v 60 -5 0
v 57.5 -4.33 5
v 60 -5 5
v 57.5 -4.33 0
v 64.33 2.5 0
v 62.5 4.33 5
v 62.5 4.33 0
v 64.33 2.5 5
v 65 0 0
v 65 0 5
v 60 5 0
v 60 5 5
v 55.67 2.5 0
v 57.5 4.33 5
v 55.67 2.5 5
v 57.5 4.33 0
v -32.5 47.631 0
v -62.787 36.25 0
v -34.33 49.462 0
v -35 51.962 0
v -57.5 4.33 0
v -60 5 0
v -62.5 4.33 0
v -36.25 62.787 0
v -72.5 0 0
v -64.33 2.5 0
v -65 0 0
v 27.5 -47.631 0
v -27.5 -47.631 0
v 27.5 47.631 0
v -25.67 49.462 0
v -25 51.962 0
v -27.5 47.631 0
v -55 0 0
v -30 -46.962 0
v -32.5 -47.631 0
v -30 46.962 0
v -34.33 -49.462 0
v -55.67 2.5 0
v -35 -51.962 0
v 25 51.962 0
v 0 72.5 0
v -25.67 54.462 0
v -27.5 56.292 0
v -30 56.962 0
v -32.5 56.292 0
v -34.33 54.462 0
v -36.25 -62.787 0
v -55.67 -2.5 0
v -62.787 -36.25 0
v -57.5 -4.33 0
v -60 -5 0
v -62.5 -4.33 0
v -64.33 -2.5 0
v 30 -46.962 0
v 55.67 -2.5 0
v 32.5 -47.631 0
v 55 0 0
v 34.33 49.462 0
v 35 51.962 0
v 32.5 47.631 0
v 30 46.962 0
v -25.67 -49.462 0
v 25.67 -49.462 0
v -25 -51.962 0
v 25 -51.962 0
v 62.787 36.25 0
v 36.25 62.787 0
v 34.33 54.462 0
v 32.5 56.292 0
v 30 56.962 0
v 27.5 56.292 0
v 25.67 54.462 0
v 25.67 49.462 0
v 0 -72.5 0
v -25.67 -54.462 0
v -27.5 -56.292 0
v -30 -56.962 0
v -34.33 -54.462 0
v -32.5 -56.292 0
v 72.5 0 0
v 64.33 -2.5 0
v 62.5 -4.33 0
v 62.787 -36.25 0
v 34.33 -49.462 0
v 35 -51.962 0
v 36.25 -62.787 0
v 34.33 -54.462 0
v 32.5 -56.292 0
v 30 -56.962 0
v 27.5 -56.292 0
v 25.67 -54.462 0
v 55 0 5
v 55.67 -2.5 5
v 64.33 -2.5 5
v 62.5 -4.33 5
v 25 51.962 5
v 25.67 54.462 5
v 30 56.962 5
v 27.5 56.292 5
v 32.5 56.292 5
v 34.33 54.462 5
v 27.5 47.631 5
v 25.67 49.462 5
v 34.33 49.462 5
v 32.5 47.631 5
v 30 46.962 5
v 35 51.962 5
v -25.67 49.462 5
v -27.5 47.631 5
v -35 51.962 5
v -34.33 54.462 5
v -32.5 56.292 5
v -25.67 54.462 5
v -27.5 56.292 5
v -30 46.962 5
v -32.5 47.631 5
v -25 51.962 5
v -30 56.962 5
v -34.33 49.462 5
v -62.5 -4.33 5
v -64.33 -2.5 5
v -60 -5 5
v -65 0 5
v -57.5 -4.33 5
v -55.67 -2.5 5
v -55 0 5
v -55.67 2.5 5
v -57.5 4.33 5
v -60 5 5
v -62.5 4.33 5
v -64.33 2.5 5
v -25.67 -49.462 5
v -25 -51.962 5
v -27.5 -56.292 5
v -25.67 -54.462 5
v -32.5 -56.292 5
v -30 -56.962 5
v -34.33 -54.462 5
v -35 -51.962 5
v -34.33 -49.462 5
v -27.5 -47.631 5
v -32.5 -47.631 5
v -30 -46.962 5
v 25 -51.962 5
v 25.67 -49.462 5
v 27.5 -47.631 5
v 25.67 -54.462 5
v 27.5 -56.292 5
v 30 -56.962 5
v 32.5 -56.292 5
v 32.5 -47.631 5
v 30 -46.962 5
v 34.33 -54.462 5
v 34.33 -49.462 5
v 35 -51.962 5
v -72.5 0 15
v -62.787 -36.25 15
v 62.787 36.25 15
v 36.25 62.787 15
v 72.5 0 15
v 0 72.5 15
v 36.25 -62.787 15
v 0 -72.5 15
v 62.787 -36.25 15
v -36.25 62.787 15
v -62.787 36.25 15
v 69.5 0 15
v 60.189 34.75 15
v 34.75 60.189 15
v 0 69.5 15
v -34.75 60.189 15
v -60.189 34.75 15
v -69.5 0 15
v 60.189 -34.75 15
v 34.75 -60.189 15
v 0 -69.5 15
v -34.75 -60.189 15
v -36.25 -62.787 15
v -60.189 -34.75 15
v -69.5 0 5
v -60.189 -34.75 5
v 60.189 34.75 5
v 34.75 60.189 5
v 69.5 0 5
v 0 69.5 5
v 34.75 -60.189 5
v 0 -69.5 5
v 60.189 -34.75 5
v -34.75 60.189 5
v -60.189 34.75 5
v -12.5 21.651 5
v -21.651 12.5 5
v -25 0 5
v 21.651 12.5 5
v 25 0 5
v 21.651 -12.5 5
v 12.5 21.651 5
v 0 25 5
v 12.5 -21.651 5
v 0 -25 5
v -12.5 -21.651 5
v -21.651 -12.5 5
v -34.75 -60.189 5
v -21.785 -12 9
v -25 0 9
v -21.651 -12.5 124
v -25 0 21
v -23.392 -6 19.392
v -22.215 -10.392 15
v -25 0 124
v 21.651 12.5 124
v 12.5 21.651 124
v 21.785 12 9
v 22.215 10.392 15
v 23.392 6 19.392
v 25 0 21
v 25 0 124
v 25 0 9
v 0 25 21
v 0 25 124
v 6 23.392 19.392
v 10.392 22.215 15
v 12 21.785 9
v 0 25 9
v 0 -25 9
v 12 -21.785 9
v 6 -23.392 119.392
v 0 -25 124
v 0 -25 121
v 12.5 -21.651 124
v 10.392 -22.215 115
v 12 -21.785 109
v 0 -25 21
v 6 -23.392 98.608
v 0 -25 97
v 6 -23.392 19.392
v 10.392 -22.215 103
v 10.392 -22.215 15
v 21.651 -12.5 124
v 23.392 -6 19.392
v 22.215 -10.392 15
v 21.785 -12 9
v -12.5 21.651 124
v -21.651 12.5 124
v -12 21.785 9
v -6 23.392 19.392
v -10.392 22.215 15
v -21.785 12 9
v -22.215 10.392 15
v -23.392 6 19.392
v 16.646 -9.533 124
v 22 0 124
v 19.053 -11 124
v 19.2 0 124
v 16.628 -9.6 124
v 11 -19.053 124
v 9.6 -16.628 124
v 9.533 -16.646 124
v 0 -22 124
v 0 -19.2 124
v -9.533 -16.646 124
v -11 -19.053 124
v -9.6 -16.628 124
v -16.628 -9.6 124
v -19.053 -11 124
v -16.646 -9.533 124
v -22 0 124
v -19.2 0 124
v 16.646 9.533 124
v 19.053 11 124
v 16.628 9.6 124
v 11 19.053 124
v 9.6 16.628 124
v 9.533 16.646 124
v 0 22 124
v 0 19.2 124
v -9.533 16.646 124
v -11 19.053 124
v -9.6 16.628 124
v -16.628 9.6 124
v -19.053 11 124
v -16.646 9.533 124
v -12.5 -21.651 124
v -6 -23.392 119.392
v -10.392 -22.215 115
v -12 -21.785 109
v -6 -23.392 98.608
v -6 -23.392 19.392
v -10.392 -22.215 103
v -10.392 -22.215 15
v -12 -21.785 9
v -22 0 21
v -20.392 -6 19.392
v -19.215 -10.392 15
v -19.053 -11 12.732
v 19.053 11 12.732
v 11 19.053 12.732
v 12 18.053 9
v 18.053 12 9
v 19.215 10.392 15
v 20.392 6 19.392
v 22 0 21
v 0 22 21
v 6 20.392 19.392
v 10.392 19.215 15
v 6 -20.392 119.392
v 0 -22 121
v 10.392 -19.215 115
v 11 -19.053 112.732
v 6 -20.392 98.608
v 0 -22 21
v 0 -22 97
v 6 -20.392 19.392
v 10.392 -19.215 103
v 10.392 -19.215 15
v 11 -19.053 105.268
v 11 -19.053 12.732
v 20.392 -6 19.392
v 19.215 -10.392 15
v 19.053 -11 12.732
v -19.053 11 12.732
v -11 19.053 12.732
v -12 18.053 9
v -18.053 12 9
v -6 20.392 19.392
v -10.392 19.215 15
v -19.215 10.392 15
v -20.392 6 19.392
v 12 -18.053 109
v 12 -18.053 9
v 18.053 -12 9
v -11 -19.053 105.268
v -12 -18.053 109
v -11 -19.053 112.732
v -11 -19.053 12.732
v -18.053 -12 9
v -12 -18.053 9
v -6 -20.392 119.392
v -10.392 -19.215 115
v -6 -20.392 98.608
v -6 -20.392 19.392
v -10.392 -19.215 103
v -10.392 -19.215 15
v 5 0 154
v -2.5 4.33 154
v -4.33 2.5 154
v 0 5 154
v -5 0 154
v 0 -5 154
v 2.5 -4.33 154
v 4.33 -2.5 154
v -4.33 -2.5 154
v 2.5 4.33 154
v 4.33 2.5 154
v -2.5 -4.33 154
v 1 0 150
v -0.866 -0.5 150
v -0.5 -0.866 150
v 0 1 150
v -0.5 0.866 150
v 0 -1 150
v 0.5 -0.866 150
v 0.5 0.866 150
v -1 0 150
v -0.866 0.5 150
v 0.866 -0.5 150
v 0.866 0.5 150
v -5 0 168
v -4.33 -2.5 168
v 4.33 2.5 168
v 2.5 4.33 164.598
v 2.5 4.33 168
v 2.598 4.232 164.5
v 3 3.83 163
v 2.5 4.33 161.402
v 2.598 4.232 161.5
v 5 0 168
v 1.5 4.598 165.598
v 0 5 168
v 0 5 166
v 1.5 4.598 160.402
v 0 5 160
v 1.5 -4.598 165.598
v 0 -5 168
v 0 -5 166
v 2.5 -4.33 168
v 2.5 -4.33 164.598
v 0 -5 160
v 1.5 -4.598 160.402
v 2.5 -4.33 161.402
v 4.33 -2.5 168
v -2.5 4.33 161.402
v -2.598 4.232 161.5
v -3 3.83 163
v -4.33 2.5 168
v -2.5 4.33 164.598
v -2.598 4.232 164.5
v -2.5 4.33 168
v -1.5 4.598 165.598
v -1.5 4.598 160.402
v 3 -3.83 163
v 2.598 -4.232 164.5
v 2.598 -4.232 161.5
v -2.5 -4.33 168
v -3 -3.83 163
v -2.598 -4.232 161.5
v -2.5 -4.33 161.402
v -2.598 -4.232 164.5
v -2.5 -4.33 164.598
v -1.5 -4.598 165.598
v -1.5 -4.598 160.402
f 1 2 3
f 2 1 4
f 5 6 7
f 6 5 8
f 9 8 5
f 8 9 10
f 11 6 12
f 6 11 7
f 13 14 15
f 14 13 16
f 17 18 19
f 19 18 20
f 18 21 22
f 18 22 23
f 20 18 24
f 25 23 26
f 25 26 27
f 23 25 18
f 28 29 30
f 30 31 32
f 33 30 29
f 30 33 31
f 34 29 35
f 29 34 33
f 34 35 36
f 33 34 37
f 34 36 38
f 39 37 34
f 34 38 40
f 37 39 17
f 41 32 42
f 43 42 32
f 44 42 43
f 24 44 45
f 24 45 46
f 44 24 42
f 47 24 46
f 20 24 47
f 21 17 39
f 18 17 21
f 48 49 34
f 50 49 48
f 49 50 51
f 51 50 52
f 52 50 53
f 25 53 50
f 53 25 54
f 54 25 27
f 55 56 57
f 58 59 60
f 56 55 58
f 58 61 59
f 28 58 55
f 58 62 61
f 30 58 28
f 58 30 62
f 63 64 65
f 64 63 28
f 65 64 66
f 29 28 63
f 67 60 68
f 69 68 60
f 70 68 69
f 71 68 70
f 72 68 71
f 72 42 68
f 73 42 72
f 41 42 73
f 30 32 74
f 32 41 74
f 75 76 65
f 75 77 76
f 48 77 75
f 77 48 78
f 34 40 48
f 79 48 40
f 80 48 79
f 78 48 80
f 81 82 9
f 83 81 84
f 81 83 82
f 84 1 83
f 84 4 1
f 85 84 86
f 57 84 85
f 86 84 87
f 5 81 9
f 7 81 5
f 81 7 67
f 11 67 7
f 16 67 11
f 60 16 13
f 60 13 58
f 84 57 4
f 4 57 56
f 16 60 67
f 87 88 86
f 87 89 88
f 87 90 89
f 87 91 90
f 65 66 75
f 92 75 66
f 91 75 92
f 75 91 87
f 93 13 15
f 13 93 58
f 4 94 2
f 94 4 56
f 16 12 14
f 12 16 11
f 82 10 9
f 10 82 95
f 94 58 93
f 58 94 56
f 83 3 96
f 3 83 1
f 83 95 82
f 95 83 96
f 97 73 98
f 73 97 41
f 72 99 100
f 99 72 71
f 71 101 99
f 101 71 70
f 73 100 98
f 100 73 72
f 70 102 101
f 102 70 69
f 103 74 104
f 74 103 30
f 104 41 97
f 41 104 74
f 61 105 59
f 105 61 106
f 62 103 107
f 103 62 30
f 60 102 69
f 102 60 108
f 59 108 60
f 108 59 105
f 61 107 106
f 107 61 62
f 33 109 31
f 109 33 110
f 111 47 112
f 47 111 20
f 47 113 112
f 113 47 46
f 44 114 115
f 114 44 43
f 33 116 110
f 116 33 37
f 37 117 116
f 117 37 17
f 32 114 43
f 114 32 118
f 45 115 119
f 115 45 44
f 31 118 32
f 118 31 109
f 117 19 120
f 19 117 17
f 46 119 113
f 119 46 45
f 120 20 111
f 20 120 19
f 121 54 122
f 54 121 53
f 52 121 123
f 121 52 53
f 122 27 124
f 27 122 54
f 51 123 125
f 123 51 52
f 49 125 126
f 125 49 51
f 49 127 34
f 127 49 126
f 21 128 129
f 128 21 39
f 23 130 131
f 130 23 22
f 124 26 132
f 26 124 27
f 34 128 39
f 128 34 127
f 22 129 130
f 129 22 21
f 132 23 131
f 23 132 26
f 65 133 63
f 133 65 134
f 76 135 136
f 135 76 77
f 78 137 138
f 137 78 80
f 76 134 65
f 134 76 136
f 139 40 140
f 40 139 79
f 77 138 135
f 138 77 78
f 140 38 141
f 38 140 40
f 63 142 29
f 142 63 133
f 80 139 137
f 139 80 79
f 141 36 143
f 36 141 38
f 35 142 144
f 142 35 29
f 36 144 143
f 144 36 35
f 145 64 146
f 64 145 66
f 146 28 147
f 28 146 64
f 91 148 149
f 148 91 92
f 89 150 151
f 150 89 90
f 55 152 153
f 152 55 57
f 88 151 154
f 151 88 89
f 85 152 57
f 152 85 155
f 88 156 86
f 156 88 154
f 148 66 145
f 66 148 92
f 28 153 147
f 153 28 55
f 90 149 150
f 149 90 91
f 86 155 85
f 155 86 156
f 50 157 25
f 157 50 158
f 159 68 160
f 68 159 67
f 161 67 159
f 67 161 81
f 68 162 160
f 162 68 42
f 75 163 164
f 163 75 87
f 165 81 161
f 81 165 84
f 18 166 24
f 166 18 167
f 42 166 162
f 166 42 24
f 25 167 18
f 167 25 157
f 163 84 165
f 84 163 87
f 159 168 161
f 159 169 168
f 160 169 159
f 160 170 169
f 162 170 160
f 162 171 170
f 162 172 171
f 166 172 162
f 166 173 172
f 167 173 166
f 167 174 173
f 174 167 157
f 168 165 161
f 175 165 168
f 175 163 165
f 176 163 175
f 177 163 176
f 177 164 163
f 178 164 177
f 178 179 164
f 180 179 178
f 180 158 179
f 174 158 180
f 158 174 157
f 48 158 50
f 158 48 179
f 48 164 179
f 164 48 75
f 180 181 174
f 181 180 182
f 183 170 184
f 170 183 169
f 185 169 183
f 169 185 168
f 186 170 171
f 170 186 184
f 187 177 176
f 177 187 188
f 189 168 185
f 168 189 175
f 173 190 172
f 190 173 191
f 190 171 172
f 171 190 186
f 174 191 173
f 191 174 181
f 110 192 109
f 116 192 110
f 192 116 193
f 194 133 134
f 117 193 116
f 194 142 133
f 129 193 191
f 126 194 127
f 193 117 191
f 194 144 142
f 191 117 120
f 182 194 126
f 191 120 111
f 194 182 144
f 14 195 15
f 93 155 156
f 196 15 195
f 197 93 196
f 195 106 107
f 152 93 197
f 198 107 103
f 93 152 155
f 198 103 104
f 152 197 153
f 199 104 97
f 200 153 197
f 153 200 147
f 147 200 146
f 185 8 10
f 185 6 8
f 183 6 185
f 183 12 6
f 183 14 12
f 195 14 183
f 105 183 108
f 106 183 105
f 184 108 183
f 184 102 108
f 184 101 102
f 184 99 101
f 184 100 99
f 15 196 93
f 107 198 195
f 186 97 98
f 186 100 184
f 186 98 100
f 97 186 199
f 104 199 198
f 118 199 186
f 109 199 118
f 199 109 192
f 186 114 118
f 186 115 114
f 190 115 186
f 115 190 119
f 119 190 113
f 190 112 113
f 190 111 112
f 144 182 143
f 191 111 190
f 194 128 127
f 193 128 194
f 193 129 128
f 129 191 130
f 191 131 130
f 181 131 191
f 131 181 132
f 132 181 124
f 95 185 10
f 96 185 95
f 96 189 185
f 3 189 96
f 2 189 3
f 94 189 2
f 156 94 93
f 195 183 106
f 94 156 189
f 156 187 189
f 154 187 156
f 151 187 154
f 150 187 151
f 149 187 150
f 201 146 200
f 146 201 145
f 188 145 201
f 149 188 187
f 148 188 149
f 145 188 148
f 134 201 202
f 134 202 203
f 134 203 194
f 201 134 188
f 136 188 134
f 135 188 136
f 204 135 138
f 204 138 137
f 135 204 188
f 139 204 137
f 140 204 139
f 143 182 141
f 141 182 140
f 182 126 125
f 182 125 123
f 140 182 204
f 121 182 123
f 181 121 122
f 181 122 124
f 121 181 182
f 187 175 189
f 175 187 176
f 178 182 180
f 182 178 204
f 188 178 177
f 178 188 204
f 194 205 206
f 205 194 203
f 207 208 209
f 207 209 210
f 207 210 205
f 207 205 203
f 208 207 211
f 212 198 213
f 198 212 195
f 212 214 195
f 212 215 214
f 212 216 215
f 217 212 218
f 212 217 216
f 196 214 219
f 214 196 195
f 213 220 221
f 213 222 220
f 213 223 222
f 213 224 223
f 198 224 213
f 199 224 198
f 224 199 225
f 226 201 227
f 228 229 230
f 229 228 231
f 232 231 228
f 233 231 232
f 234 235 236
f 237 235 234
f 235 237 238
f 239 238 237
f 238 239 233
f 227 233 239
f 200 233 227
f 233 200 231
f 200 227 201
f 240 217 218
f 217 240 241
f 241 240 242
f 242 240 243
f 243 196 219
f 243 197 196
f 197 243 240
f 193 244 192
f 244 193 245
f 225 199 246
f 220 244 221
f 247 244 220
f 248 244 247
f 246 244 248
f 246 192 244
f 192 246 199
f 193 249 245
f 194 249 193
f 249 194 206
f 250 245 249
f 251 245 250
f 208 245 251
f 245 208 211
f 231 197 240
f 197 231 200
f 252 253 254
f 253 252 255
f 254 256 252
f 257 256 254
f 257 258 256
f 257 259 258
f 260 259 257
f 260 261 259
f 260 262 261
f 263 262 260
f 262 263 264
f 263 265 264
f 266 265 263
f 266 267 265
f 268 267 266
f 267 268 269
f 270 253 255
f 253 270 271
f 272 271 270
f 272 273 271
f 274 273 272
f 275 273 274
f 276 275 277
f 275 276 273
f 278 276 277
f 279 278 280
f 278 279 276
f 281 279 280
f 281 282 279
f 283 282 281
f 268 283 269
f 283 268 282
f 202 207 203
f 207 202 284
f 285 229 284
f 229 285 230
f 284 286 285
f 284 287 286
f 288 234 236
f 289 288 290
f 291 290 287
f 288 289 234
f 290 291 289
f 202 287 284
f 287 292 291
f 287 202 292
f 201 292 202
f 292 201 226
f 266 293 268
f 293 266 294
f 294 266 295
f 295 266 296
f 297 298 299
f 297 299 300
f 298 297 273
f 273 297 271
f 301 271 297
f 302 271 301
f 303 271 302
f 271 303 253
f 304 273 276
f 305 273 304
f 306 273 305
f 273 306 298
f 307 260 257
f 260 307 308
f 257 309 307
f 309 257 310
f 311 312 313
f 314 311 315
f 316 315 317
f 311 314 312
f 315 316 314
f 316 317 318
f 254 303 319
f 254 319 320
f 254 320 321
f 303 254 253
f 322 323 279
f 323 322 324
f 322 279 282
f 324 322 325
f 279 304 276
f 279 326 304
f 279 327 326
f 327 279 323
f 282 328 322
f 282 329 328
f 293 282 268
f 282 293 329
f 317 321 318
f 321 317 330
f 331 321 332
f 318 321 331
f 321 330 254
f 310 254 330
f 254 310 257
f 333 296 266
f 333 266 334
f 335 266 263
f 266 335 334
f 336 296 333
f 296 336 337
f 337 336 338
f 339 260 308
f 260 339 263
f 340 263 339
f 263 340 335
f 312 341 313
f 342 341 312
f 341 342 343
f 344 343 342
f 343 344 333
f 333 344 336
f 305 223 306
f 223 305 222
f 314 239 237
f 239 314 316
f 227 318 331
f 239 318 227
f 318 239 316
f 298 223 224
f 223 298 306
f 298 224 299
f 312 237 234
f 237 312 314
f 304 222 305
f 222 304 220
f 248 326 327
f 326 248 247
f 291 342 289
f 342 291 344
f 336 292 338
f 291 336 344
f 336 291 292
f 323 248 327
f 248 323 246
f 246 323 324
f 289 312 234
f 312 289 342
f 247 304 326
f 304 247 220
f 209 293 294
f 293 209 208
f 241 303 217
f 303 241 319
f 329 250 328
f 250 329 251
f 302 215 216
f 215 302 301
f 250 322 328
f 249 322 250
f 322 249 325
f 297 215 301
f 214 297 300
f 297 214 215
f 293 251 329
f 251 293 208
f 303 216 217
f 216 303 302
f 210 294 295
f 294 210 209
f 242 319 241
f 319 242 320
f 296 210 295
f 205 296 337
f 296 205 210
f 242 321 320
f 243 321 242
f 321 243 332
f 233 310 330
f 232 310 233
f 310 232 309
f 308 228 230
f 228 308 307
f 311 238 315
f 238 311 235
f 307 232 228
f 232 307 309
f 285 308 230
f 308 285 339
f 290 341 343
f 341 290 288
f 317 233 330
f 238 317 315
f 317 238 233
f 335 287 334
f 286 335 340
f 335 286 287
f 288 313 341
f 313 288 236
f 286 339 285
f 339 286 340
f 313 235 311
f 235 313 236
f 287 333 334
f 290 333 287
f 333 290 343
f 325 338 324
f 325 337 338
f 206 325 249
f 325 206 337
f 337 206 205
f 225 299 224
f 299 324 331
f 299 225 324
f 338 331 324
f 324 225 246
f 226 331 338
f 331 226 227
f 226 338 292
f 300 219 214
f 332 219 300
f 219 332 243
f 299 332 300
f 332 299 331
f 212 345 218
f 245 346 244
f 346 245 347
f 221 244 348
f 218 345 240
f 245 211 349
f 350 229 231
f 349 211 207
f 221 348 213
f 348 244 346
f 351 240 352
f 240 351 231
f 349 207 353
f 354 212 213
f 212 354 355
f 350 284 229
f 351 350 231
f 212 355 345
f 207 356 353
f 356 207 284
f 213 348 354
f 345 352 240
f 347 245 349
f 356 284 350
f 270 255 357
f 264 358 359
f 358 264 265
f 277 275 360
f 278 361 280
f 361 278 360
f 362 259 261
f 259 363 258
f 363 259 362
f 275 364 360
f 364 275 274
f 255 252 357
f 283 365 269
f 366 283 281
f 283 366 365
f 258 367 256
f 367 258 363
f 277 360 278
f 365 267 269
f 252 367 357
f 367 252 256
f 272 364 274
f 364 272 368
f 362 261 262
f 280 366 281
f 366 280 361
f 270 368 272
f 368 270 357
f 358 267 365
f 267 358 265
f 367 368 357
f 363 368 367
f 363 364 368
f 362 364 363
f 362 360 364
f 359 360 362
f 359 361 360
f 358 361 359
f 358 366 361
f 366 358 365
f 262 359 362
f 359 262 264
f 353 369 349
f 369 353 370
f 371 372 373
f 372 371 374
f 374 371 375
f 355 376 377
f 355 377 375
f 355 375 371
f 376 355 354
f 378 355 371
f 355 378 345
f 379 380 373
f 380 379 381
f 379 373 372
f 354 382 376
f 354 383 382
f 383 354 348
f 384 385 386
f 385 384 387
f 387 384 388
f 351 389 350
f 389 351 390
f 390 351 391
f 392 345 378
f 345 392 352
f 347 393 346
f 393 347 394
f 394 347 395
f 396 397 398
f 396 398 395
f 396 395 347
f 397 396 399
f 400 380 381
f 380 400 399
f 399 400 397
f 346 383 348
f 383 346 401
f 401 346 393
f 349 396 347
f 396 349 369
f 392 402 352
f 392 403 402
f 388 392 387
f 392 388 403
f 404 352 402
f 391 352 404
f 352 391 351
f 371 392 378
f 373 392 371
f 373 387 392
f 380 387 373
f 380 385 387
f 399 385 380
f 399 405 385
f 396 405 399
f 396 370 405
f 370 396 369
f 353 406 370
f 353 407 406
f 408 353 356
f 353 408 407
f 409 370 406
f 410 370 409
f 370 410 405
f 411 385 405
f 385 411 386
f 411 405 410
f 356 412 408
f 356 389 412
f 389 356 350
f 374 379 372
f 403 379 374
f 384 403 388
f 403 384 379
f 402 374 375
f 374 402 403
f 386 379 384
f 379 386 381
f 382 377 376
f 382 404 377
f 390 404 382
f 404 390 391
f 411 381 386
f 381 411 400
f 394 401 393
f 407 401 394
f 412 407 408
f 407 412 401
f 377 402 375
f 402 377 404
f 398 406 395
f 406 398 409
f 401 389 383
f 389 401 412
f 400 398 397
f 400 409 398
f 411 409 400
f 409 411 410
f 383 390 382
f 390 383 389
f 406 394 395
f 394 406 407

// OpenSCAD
/*
    Openscad Birdfeeder.

    Copyright (C) 2014. Tim Molteno, tim@molteno.net
  
    This program is free software: you can redistribute it and/or modify
    it under the terms of the GNU General Public License as published by
    the Free Software Foundation, either version 3 of the License, or
    (at your option) any later version.

    This program is distributed in the hope that it will be useful,
    but WITHOUT ANY WARRANTY; without even the implied warranty of
    MERCHANTABILITY or FITNESS FOR A PARTICULAR PURPOSE.  See the
    GNU General Public License for more details.

    You should have received a copy of the GNU General Public License
    along with this program.  If not, see <http://www.gnu.org/licenses/>.
*/
$fn=12;

hopper_height = 120;
wall_thickness = 3; 
base_diameter = 145;

module base() {
  difference() {
   cylinder(r=base_diameter/2, h=15);
   translate([0,0,5]) cylinder(r=base_diameter/2 - wall_thickness, h=15);
   
   for (angle = [0:60:300]) {
     rotate(angle) translate([60,0,0]) cylinder(r=5, h=25);
   }
  }
}


module hopper() {
  union() { 
  difference() {
    cylinder(r=25, h=hopper_height);
    translate([0,0,0]) cylinder(r=25-wall_thickness, h=hopper_height+5);
    translate([0,0,5]) rotate([90,0,0]) cylinder(r=12, h=100, center=true);
    translate([0,0,5]) rotate([0,90,0]) cylinder(r=12, h=100, center=true);
    translate([0,0,hopper_height-15]) rotate([90,0,0]) cylinder(r=12, h=100);
  }
  cylinder(r=25, h=5); // base plate
}
}

module cap() {
  translate([0,0,hopper_height]) {
    difference() {
      translate([0,0,4]) cylinder(r1=25, r2=5, h=30);
      cylinder(r1=25-wall_thickness, r2=1, h=30);
    }
    translate([0,0,33]) {
      difference() {
        cylinder(r=5, h=15);
        translate([0,0,10]) rotate([90,0,0]) cylinder(r=3, h=30, center=true); 
      }
    }
  }
}

union() {
  base();
  translate([0,0,4]) hopper();
  cap();
}
